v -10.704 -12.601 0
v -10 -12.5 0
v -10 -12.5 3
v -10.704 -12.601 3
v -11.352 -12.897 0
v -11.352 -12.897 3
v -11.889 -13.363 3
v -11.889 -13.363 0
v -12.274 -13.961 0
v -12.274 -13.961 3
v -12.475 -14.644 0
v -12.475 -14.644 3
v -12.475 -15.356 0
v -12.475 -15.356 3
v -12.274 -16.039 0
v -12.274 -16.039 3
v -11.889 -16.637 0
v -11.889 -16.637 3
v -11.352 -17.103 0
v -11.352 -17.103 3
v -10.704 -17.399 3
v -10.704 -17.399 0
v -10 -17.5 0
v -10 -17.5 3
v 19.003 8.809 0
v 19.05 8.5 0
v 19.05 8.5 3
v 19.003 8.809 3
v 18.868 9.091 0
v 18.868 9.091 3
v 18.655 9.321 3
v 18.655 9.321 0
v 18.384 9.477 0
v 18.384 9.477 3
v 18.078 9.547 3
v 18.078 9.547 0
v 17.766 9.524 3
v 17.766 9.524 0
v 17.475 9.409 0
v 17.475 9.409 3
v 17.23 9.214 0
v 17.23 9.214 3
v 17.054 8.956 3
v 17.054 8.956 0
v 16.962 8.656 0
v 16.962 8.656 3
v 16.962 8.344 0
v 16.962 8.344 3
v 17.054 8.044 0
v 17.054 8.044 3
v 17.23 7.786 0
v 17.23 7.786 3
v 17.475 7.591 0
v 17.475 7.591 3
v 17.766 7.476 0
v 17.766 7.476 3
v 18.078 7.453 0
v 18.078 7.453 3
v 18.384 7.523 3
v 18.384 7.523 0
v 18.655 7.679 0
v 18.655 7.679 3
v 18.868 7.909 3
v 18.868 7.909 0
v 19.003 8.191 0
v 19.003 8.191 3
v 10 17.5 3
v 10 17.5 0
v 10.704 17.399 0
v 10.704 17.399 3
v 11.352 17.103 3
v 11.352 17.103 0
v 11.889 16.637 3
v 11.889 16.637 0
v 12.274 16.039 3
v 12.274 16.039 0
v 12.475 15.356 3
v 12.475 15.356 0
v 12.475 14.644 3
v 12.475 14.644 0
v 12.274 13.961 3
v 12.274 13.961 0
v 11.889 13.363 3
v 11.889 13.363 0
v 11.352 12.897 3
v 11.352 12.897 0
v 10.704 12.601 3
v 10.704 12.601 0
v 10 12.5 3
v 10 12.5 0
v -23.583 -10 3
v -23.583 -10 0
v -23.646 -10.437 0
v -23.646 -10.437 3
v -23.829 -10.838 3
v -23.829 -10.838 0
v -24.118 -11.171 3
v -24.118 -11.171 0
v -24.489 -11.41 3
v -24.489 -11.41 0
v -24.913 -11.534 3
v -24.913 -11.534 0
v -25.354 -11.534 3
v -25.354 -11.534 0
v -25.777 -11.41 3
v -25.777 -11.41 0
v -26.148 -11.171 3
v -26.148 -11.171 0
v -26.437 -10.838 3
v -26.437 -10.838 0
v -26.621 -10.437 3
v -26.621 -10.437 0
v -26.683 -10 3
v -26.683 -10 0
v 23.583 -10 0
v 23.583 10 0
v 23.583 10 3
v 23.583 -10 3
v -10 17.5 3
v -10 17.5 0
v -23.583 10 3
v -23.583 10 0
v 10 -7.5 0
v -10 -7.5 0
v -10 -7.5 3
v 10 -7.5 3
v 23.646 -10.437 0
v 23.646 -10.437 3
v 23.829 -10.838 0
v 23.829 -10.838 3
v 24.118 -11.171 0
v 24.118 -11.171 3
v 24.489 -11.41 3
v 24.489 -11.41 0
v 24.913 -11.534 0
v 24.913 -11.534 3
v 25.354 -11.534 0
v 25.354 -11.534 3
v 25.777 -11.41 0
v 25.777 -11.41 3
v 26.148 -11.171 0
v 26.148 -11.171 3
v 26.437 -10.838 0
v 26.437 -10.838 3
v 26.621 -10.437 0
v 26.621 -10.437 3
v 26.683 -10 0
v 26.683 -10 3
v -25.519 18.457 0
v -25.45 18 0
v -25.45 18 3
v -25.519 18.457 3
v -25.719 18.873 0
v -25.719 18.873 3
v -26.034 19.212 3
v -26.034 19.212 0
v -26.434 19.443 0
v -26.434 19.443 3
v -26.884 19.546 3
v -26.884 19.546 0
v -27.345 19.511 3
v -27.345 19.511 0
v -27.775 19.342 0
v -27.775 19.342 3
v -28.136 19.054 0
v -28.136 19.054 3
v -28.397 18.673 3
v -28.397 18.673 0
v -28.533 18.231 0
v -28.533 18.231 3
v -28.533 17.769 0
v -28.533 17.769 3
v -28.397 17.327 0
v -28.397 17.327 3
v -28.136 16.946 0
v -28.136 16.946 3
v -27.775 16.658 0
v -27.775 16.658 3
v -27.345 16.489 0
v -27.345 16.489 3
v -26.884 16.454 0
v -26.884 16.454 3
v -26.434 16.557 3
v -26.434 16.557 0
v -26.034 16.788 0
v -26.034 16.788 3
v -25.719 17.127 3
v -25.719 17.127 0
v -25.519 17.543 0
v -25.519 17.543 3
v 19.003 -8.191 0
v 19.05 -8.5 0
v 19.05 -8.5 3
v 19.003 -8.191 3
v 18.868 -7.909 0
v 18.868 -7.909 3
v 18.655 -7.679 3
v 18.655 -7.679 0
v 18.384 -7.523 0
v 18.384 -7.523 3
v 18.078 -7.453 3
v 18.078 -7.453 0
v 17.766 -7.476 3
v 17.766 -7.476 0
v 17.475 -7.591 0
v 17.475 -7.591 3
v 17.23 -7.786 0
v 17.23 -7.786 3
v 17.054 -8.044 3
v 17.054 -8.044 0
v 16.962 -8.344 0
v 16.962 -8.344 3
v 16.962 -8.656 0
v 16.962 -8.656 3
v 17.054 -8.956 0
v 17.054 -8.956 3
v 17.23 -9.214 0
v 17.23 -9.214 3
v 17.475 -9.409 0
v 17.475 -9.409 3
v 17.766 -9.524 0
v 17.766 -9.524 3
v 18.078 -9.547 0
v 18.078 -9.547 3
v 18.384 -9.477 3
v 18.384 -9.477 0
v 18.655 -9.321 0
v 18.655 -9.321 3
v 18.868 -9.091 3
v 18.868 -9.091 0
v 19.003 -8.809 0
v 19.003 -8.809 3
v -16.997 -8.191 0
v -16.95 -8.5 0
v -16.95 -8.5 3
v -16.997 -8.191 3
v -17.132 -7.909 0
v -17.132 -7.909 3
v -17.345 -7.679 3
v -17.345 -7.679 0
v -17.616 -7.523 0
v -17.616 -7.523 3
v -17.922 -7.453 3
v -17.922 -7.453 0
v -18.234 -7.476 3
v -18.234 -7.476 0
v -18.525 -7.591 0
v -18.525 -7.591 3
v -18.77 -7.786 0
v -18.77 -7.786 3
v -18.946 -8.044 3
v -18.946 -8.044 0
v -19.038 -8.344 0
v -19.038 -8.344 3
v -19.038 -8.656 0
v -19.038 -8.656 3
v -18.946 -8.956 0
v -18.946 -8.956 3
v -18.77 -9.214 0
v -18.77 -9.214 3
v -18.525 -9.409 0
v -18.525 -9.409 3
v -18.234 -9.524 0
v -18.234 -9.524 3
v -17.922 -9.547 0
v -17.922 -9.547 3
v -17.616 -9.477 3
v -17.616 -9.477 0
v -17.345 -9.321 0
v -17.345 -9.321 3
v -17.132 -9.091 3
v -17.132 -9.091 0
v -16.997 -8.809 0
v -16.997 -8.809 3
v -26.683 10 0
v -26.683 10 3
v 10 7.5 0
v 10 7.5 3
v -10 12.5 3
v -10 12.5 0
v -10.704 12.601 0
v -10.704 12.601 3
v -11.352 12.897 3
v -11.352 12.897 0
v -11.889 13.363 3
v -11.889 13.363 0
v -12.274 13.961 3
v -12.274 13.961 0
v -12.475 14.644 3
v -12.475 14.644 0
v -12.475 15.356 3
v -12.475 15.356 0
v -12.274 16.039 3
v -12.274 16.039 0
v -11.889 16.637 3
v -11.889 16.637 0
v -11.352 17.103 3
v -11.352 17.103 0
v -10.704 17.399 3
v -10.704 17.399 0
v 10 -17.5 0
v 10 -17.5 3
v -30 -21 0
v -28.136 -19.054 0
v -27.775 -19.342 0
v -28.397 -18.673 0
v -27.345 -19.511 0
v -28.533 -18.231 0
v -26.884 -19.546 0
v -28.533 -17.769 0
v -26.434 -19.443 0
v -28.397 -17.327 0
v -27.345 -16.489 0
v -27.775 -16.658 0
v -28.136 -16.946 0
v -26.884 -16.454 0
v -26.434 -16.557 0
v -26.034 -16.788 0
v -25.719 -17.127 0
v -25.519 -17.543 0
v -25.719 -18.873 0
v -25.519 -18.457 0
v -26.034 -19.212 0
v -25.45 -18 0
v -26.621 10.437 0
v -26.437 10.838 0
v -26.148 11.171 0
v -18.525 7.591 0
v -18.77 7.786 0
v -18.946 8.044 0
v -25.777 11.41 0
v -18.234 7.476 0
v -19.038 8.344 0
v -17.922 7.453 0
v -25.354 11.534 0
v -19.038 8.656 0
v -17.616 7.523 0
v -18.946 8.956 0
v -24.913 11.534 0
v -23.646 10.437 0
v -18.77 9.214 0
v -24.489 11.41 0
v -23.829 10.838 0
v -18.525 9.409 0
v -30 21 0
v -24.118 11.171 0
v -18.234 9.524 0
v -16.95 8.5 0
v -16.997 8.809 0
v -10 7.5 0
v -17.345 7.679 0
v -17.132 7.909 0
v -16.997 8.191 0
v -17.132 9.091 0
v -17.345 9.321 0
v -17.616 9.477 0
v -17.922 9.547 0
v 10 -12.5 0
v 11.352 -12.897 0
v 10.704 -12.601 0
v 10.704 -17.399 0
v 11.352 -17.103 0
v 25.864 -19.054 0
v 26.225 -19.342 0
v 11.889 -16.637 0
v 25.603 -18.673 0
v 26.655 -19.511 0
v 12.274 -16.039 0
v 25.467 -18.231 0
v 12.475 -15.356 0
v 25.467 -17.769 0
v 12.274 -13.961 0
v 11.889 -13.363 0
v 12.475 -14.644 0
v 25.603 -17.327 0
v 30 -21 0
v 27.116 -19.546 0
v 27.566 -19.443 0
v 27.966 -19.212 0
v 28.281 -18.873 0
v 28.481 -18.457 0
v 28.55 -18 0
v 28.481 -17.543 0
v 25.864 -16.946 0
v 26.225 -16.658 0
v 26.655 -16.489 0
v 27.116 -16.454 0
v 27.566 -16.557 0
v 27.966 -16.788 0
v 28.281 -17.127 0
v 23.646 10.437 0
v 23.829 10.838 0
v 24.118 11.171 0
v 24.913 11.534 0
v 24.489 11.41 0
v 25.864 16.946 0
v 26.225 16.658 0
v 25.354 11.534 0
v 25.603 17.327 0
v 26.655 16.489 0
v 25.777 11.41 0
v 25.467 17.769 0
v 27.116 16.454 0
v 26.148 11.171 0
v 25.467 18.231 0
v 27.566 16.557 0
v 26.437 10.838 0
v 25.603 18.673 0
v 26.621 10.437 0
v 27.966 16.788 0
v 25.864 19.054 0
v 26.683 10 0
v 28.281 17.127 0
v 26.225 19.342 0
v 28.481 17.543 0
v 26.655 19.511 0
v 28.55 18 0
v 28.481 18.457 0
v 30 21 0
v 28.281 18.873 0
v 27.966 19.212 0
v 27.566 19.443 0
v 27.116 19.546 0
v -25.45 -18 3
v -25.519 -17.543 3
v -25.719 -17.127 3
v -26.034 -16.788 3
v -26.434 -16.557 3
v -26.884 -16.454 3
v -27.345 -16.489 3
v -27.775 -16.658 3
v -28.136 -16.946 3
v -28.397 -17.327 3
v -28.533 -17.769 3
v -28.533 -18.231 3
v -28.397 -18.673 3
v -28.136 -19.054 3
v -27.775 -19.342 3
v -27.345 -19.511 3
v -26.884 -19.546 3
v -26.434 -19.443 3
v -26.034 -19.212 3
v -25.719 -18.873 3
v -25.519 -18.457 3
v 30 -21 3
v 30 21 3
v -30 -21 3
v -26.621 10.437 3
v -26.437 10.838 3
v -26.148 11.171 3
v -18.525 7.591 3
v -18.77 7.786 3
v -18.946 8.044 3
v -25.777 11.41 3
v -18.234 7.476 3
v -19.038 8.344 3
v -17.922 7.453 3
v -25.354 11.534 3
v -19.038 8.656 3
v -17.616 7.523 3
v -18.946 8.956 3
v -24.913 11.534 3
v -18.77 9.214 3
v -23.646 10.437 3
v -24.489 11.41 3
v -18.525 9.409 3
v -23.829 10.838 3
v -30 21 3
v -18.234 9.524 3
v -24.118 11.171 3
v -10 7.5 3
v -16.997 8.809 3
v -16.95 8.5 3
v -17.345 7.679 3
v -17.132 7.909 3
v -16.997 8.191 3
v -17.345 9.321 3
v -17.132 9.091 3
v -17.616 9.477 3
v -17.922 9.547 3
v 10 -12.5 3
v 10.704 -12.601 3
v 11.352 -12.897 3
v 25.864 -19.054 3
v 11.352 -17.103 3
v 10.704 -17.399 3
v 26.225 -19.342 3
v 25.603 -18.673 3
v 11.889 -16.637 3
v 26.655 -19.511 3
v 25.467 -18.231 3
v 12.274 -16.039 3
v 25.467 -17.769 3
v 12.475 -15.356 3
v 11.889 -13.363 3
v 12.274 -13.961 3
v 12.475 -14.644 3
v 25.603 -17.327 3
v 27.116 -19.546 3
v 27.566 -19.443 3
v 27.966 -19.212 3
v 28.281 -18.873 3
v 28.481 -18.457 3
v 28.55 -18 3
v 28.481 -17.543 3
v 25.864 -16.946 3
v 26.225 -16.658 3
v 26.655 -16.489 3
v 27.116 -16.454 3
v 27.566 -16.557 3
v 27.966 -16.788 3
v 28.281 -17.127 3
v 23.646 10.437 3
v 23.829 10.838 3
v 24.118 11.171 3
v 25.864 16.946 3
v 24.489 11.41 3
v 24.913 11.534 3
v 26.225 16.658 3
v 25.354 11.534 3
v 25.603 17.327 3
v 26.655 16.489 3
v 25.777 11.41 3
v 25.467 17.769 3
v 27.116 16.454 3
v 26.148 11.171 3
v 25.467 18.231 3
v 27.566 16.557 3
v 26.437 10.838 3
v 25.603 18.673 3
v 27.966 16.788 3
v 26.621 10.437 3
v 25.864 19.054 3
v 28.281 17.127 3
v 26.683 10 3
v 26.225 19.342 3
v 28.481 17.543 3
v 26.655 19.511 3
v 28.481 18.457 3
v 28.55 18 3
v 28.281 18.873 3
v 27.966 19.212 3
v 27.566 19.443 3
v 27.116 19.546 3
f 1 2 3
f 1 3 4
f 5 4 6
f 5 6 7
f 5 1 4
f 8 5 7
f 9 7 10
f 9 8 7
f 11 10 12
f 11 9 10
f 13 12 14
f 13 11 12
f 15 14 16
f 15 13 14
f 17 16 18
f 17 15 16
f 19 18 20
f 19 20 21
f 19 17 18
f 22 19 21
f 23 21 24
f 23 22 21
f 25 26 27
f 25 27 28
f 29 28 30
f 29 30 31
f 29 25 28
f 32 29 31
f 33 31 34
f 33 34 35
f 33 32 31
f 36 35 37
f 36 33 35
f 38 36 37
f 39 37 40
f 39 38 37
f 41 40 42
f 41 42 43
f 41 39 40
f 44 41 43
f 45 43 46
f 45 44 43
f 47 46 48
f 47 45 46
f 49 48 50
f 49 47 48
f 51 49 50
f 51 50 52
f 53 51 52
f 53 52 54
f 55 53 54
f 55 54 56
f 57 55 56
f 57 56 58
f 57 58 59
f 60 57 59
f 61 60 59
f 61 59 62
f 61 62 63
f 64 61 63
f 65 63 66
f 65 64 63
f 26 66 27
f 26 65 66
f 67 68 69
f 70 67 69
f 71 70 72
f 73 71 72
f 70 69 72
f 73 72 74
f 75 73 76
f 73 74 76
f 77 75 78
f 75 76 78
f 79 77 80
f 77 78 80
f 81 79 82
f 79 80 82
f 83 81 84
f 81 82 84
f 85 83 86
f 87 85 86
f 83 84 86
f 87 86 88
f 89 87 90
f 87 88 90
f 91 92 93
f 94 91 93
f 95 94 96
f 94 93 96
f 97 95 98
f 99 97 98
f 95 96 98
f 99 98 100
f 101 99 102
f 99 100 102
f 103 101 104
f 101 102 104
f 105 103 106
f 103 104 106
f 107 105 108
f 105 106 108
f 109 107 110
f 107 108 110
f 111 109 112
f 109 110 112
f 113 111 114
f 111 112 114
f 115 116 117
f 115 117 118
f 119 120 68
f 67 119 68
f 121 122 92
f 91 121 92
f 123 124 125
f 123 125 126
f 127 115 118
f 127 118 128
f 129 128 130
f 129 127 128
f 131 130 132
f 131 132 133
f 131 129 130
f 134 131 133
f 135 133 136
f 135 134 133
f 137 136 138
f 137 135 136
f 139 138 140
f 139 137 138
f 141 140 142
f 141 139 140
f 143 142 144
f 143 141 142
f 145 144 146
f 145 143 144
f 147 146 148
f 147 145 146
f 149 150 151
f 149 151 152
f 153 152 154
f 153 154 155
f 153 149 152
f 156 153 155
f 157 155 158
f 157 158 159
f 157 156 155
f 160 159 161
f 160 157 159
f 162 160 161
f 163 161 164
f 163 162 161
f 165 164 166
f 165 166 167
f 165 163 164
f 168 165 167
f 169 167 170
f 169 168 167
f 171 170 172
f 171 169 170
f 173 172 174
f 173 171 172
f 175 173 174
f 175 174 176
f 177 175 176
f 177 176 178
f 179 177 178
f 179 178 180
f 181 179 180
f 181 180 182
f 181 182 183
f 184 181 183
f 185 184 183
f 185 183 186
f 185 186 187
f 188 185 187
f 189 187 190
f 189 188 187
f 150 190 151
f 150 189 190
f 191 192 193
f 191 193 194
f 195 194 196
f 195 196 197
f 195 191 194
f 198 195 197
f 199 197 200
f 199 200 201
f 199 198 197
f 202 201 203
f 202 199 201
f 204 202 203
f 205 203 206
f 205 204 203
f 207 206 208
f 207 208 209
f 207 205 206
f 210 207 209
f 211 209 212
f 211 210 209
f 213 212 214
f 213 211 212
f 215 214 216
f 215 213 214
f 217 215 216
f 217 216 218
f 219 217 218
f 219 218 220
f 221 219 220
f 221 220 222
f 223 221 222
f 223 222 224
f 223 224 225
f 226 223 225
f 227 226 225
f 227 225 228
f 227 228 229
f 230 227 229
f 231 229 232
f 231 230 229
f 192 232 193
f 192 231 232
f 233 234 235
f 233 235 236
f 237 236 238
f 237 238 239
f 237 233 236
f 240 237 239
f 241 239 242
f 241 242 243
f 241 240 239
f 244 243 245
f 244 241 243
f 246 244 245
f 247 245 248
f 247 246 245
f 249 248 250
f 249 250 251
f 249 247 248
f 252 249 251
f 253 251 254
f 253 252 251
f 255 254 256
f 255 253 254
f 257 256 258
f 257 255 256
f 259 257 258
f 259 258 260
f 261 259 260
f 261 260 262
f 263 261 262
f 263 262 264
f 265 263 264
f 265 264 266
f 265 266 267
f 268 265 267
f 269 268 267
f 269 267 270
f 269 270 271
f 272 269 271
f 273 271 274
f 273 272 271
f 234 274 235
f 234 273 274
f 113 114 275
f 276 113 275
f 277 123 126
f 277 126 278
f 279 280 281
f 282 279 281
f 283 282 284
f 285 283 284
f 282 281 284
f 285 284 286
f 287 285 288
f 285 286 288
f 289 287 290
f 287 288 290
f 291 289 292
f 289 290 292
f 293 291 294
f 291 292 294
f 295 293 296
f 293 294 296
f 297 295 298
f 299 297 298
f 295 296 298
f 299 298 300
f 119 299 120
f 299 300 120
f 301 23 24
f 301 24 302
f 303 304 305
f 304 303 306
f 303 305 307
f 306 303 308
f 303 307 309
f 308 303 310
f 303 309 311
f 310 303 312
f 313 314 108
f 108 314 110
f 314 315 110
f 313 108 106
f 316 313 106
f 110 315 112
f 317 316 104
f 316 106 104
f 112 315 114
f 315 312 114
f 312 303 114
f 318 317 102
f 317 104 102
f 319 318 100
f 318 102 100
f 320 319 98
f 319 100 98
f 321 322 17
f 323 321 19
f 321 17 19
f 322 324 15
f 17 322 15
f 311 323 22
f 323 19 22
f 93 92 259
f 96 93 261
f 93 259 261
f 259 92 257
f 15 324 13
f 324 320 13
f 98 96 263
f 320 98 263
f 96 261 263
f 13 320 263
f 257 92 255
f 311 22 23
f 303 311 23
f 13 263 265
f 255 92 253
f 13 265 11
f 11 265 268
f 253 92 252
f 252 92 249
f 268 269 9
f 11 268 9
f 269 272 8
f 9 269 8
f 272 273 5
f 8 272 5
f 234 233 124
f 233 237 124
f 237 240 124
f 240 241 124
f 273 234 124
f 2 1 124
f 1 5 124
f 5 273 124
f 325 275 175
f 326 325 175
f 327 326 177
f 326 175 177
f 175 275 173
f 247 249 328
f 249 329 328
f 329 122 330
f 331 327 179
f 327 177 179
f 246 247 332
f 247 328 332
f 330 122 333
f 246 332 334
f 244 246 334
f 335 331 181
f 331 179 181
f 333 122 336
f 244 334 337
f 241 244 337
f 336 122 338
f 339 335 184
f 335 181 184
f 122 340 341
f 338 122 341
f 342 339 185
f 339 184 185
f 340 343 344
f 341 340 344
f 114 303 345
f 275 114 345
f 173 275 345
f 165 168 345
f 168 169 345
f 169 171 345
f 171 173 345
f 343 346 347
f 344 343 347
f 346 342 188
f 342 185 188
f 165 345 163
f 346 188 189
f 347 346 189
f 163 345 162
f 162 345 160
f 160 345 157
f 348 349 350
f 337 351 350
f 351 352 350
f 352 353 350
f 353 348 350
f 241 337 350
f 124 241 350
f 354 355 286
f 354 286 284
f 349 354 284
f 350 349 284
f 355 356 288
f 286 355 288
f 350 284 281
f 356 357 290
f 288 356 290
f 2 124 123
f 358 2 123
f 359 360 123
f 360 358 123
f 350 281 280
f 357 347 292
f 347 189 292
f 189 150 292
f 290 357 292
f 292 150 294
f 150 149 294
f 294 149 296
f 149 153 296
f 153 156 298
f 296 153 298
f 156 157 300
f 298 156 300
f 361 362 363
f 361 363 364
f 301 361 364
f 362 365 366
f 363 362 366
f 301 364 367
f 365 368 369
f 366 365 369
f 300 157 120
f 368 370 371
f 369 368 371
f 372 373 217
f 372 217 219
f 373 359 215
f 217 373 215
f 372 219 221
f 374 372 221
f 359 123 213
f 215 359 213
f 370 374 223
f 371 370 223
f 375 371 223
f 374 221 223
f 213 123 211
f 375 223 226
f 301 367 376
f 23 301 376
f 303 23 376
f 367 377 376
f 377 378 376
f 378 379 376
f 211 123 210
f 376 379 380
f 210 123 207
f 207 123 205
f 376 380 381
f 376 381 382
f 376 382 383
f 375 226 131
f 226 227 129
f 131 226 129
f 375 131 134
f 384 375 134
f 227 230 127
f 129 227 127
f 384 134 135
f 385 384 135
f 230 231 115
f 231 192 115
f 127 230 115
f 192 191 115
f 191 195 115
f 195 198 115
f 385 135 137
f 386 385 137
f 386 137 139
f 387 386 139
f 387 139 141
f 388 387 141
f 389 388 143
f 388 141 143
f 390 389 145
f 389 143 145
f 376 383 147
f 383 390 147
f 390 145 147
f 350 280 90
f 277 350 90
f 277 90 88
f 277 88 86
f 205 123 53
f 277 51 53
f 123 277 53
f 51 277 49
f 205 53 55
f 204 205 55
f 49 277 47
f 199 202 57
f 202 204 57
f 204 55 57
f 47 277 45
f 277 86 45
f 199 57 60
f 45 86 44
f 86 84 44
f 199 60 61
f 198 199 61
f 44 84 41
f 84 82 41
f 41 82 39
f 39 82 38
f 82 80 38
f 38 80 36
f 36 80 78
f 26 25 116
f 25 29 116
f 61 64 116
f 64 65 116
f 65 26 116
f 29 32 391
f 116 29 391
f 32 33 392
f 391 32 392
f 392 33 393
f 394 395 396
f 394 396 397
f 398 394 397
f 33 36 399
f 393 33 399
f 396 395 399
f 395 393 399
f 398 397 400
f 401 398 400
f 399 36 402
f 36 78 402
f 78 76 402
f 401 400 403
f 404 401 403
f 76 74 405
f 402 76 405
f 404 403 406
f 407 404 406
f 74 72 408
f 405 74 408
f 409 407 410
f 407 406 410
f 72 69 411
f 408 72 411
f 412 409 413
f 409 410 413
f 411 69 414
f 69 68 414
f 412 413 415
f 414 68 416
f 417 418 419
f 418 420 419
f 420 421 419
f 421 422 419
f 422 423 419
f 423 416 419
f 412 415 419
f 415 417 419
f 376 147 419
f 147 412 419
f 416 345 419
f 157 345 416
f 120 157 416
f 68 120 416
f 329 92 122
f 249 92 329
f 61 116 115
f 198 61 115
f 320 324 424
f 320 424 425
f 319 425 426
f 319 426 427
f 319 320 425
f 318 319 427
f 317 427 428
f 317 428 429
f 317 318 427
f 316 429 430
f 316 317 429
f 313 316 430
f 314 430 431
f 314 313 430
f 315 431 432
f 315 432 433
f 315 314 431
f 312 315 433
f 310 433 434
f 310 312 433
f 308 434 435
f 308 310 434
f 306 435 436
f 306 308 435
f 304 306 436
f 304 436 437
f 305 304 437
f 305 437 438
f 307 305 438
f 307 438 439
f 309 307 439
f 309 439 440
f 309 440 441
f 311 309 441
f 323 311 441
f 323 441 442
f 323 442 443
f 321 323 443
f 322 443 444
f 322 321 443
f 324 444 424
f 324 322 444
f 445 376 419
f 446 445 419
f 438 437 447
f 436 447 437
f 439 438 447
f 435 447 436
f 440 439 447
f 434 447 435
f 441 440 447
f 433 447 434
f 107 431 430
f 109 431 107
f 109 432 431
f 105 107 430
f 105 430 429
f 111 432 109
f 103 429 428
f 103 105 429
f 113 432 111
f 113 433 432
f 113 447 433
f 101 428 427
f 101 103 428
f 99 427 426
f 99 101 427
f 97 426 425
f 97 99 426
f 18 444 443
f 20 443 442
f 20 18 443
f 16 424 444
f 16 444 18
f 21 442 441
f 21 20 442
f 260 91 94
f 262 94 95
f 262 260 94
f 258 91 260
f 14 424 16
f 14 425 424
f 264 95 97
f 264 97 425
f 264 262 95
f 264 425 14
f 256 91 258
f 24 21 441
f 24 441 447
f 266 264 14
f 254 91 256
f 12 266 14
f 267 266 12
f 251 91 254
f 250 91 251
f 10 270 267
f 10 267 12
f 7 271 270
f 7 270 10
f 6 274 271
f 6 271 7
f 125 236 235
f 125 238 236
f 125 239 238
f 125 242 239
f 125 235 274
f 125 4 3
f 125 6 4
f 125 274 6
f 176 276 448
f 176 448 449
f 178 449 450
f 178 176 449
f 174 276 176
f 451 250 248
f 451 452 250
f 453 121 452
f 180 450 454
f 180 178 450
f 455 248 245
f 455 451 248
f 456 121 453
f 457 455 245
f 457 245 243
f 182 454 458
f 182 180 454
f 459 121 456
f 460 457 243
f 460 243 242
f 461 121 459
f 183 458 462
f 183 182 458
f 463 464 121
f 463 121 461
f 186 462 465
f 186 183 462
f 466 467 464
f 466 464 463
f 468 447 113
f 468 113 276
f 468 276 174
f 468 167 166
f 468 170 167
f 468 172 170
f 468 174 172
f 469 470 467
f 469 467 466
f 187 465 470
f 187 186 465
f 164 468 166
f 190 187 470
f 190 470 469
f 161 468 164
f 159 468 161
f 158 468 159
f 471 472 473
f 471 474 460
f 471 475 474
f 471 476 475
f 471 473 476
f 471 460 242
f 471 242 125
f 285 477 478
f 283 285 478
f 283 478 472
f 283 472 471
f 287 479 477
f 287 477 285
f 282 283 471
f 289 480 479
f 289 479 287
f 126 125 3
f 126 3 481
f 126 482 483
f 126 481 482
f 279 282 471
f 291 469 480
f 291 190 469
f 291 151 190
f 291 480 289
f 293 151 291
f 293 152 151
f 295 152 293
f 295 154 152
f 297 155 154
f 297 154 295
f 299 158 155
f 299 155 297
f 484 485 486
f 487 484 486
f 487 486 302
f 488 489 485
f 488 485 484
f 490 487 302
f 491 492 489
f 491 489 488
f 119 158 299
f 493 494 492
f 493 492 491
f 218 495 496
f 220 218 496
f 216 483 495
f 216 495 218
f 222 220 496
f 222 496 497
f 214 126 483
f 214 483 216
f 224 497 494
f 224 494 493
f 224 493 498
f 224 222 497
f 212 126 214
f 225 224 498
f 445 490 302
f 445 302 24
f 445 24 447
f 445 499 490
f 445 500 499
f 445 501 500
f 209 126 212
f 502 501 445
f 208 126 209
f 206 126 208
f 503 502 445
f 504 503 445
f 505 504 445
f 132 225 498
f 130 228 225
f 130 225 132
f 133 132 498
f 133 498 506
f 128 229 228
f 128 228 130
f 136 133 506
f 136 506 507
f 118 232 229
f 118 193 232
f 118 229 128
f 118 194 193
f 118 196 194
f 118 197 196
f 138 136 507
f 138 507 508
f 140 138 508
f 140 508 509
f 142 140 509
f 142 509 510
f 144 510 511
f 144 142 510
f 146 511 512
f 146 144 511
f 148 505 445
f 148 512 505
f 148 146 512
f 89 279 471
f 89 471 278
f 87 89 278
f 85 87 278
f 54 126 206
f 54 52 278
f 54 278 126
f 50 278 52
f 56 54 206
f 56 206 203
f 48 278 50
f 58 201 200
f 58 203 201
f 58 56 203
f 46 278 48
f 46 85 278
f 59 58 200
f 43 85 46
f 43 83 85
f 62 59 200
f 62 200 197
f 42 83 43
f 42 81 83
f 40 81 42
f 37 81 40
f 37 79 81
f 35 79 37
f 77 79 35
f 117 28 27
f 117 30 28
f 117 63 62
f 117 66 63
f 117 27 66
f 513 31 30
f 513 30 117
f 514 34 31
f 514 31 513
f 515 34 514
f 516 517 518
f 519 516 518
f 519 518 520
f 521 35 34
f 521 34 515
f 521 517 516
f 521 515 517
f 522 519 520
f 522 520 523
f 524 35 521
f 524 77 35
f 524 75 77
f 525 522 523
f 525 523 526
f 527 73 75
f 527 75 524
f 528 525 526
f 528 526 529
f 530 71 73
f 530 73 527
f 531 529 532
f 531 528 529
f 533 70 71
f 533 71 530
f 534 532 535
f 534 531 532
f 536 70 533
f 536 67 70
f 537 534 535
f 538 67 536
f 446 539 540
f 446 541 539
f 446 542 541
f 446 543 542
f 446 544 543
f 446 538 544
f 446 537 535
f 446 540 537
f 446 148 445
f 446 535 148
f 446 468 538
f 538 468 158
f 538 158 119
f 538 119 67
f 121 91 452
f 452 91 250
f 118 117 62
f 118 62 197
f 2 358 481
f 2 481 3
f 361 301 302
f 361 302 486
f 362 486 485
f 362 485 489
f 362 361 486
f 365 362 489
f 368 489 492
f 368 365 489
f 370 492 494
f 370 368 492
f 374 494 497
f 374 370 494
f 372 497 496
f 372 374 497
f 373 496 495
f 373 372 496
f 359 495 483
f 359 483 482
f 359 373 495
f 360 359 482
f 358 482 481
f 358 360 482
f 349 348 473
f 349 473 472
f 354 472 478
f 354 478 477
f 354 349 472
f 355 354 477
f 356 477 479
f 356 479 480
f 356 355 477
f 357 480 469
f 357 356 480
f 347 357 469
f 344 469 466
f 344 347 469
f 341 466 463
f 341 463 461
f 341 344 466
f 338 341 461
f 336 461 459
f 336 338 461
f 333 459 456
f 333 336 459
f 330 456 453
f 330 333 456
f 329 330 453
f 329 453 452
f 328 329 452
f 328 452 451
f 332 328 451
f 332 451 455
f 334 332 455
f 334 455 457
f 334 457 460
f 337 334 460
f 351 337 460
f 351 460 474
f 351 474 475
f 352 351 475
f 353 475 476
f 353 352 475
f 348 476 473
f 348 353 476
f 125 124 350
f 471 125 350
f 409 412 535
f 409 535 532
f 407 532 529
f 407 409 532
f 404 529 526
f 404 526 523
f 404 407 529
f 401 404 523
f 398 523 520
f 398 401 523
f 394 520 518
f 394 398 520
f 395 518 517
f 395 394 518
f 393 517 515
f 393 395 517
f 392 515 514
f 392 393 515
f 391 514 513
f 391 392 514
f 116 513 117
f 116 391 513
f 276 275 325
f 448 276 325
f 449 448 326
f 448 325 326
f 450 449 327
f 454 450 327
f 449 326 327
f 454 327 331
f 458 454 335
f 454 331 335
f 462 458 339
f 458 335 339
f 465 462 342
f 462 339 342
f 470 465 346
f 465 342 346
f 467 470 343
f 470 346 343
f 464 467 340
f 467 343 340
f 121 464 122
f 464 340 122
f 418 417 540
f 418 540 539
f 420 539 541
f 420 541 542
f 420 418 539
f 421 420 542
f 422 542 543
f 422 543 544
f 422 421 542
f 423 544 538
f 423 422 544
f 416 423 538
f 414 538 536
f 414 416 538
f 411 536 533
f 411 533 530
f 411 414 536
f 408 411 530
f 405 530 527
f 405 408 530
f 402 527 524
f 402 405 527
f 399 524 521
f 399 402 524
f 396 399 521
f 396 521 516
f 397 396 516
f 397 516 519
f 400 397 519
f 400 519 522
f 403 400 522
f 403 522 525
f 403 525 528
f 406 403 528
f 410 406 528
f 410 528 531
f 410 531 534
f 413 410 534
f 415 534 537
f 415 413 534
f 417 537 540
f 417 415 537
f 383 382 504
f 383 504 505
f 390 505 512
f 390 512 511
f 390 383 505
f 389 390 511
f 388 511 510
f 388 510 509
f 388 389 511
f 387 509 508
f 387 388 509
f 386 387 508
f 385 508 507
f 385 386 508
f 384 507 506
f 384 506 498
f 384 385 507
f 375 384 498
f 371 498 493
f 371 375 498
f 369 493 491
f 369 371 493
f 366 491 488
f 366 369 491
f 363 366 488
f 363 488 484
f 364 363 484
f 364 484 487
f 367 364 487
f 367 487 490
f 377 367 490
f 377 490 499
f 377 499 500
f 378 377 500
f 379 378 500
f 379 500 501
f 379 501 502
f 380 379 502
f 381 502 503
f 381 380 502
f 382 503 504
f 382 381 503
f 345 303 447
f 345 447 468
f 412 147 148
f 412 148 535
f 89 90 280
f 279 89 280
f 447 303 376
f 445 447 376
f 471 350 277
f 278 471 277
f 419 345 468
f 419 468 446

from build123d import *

# Parameters (mm, degrees)
SKETCH_1_W      = 60
SKETCH_1_H      = 42
SKETCH_1_R      = 1.05
SKETCH_1_R_2    = 1.55
SKETCH_1_W_2    = 20
SKETCH_1_H_2    = 15
EXTRUDE_1_DEPTH = 3


with BuildPart() as part:
    # 草图1 → 凸台-拉伸1 (new body)
    with BuildSketch(Plane.XY):
        Rectangle(SKETCH_1_W, SKETCH_1_H)
        with Locations((-18, -8.5)):
            Circle(SKETCH_1_R, mode=Mode.SUBTRACT)
        with Locations((-18, 8.5)):
            Circle(SKETCH_1_R, mode=Mode.SUBTRACT)
        with Locations((18, 8.5)):
            Circle(SKETCH_1_R, mode=Mode.SUBTRACT)
        with Locations((18, -8.5)):
            Circle(SKETCH_1_R, mode=Mode.SUBTRACT)
        with Locations((-27, -18)):
            Circle(SKETCH_1_R_2, mode=Mode.SUBTRACT)
        with Locations((27, -18)):
            Circle(SKETCH_1_R_2, mode=Mode.SUBTRACT)
        with Locations((27, 18)):
            Circle(SKETCH_1_R_2, mode=Mode.SUBTRACT)
        with Locations((-27, 18)):
            Circle(SKETCH_1_R_2, mode=Mode.SUBTRACT)
        Rectangle(SKETCH_1_W_2, SKETCH_1_H_2, mode=Mode.SUBTRACT)
        with BuildLine():
            Line((-10, 17.5), (10, 17.5))
            ThreePointArc((10, 17.5), (12.5, 15), (10, 12.5))
            Line((10, 12.5), (-10, 12.5))
            ThreePointArc((-10, 12.5), (-12.5, 15), (-10, 17.5))
        make_face(mode=Mode.SUBTRACT)
        with BuildLine():
            Line((-10, -17.5), (10, -17.5))
            ThreePointArc((10, -17.5), (12.5, -15), (10, -12.5))
            Line((10, -12.5), (-10, -12.5))
            ThreePointArc((-10, -12.5), (-12.5, -15), (-10, -17.5))
        make_face(mode=Mode.SUBTRACT)
        with BuildLine():
            Line((-23.583325542, 10), (-23.583325542, -10))
            ThreePointArc((-23.583325542, -10), (-25.133325542, -11.55), (-26.683325542, -10))
            Line((-26.683325542, -10), (-26.683325542, 10))
            ThreePointArc((-26.683325542, 10), (-25.133325542, 11.55), (-23.583325542, 10))
        make_face(mode=Mode.SUBTRACT)
        with BuildLine():
            Line((23.583325542, 10), (23.583325542, -10))
            ThreePointArc((23.583325542, -10), (25.133325542, -11.55), (26.683325542, -10))
            Line((26.683325542, -10), (26.683325542, 10))
            ThreePointArc((26.683325542, 10), (25.133325542, 11.55), (23.583325542, 10))
        make_face(mode=Mode.SUBTRACT)
    extrude(amount=EXTRUDE_1_DEPTH)


solid = part.part
